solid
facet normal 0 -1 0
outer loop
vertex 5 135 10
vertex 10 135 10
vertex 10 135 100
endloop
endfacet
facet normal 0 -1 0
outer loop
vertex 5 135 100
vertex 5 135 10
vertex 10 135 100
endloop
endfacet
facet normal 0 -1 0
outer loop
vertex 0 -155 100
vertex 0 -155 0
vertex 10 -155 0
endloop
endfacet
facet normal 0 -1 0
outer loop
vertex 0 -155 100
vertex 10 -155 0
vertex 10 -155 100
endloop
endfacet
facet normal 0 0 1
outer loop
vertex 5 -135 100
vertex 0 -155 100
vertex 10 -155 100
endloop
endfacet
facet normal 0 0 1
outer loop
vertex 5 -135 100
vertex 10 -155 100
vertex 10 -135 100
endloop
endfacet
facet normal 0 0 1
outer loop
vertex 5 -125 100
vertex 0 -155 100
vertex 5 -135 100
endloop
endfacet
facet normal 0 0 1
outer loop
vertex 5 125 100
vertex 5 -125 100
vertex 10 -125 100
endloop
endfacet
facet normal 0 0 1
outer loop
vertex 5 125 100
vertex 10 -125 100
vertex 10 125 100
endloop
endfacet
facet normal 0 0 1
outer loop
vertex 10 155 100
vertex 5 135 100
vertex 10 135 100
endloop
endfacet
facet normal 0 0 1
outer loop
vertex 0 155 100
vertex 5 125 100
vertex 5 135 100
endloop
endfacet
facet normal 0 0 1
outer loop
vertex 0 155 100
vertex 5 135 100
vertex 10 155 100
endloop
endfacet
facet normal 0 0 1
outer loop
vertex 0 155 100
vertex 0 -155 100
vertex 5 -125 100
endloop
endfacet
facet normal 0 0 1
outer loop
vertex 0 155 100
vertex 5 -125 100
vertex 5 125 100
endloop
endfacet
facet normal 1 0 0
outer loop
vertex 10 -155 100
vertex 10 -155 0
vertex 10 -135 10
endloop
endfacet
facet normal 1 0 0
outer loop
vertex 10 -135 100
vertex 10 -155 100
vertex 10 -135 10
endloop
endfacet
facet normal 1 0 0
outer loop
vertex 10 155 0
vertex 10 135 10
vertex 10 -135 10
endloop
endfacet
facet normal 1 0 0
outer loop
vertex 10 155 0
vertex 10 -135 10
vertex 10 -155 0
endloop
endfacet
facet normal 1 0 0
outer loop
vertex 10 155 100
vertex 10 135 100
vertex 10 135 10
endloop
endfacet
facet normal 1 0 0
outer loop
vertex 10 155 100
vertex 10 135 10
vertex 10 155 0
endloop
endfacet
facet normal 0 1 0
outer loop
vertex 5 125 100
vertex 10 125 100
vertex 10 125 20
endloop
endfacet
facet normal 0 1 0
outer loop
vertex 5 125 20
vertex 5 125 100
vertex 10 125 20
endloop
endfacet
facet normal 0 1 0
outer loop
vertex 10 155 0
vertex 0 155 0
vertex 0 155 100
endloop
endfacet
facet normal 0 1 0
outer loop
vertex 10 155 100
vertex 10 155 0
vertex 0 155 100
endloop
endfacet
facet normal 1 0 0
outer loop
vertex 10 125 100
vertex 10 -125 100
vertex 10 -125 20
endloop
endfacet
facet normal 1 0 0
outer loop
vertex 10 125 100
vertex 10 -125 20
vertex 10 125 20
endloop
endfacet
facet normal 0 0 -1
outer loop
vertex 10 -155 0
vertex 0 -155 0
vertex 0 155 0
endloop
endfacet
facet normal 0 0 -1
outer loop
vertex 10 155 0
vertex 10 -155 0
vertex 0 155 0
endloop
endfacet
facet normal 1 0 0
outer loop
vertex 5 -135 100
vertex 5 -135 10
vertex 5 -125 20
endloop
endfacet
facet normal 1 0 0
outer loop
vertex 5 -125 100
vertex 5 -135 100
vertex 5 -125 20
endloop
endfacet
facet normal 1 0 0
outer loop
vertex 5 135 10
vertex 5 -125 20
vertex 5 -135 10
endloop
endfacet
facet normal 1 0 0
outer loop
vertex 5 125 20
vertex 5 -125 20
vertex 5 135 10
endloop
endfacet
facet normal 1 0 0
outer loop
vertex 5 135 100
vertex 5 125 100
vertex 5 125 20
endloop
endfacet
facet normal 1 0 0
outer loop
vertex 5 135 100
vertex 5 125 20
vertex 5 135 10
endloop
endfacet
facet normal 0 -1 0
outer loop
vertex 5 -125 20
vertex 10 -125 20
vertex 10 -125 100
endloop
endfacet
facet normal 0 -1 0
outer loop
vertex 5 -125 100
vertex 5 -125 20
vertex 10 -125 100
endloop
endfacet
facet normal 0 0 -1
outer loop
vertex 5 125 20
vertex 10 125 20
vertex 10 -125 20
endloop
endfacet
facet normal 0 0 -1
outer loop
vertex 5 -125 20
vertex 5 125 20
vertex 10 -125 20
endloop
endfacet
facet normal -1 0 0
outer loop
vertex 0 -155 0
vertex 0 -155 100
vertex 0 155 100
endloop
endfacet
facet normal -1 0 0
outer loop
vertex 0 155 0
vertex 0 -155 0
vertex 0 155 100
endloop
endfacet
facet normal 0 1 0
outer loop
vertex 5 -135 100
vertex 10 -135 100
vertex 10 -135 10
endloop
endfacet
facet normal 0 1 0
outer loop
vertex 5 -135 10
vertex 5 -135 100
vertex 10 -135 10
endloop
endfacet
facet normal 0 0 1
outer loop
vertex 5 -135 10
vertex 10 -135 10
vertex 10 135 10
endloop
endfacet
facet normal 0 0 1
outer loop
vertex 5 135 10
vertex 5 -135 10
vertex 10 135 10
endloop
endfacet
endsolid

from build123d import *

# Parameters (mm, degrees)
F0_W     = 310
F0_H     = 100
F1_DEPTH = 10
F3_DEPTH = 5


with BuildPart() as f1:
    # F0 (on Right) → F1 (new body)
    with BuildSketch(Plane.YZ):
        with Locations((0, 50)):
            Rectangle(F0_W, F0_H)
    extrude(amount=F1_DEPTH)

    # F2 (on face) → F3 (cut)
    with BuildSketch(Plane.YZ.offset(10)):
        Polygon((-125, 100), (-135, 100), (-135, 10), (0, 10), (135, 10), (135, 100), (125, 100), (125, 20), (0, 20), (-125, 20), align=None)
    extrude(amount=-F3_DEPTH, mode=Mode.SUBTRACT)


solid = f1.part
